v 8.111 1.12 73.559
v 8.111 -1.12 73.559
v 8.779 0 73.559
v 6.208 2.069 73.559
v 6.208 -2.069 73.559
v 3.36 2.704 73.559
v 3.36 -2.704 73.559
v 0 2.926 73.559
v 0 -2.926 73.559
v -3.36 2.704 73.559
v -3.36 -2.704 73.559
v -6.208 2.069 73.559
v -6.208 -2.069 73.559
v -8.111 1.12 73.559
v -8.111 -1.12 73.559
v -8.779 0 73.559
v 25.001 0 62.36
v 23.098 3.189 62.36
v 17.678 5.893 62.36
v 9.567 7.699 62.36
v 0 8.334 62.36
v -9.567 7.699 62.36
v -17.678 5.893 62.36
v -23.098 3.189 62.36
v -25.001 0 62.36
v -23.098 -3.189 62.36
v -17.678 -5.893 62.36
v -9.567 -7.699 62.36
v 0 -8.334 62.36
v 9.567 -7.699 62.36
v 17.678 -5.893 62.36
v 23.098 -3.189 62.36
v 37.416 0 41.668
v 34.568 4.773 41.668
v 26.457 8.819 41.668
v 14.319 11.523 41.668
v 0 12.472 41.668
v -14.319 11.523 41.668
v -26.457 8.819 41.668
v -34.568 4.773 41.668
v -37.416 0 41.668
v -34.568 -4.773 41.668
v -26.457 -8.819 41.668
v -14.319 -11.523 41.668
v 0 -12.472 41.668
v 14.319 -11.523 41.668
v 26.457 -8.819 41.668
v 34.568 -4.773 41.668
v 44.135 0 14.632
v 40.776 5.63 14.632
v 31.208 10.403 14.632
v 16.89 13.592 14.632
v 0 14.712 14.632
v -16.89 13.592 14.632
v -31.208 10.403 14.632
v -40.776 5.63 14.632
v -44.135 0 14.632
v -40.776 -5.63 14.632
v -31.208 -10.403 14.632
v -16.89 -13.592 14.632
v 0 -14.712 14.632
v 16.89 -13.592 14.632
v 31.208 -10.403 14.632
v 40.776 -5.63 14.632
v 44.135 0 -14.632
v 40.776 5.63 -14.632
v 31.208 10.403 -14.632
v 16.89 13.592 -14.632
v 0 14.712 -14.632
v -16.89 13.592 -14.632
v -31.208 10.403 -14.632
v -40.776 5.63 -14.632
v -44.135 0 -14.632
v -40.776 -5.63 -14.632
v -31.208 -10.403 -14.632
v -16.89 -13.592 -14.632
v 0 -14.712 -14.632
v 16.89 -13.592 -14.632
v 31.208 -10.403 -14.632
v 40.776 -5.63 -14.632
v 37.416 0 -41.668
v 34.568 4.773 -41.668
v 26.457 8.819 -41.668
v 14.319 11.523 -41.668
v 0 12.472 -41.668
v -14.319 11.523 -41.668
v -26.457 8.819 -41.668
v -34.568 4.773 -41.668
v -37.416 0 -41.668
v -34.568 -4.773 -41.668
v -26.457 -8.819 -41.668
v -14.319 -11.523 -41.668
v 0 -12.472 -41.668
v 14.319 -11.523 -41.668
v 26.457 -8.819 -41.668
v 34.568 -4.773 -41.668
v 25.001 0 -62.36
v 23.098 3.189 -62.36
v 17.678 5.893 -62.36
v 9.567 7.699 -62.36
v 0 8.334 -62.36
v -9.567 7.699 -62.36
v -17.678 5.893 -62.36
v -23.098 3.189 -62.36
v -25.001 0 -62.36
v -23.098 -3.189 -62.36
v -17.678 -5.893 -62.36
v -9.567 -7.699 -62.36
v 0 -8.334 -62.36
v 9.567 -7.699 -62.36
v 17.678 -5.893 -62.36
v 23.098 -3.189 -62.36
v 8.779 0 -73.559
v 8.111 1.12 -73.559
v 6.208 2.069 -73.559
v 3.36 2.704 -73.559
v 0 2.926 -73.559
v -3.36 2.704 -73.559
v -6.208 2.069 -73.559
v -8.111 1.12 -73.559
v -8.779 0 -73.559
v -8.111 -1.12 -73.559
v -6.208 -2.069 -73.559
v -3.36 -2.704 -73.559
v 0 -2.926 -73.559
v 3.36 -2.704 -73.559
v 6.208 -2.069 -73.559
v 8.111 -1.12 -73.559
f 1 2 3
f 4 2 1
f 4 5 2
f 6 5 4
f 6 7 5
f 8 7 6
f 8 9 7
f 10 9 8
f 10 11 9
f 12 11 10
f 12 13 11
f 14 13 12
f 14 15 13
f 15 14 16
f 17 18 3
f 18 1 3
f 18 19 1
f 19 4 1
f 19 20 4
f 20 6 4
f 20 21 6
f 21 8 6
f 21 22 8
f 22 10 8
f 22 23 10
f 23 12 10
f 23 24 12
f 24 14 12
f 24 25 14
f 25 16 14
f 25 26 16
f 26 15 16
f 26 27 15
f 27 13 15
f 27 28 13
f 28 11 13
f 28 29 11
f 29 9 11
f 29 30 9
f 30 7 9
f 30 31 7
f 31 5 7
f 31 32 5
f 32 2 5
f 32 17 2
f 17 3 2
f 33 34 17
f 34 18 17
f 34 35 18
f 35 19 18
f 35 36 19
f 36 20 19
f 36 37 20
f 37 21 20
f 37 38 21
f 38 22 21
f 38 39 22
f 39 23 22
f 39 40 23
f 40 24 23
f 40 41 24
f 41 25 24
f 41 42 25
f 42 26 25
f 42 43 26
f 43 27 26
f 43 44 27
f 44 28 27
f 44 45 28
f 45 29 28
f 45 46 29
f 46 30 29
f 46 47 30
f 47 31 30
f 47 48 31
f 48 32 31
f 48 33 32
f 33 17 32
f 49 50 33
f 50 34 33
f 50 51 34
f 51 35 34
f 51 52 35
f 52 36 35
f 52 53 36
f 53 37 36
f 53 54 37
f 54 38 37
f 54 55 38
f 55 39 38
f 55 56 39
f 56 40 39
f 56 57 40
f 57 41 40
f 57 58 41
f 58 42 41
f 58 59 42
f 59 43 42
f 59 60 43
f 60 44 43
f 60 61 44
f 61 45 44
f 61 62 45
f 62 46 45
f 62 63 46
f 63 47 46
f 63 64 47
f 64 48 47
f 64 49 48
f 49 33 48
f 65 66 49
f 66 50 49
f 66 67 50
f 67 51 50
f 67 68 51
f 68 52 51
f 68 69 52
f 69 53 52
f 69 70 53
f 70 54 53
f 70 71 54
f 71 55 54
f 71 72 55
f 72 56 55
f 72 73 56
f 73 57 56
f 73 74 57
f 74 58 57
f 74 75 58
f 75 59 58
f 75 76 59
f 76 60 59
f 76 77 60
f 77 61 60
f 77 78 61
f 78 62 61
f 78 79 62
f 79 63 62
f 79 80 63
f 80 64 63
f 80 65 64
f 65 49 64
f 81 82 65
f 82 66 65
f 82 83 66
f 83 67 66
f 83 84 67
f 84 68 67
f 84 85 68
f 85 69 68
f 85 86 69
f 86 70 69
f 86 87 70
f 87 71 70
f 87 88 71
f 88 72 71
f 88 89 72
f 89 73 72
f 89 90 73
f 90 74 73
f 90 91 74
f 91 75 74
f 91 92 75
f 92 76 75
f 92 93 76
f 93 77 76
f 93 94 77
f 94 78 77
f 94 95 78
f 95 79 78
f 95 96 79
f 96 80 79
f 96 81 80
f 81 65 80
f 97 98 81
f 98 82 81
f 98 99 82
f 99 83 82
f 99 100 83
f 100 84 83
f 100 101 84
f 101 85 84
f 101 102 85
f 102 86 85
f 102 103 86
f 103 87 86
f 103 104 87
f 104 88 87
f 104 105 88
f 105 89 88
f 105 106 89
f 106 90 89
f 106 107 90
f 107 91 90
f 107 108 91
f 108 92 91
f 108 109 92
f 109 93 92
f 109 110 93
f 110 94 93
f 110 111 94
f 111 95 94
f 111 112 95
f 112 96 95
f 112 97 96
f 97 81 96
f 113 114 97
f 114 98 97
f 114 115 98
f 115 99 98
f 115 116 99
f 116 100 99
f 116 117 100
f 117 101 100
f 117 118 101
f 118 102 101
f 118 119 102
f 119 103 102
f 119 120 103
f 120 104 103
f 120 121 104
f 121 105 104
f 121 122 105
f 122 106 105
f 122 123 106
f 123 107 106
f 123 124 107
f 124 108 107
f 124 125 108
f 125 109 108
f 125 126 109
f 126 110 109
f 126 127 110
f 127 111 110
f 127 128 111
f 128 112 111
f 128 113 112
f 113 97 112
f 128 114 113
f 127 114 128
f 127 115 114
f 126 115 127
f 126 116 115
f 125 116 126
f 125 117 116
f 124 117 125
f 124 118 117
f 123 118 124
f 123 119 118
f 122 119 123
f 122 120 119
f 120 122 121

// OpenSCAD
// Generated by SolidPython 1.0.1 on 2020-07-29 00:46:48


scale(v = [9, 3, 15]) {
	sphere(r = 5);
}
/***********************************************
*********      SolidPython code:      **********
************************************************
 
# import packages: SolidPython
from solid import *
from solid.utils import *
from itertools import chain, combinations, permutations


class Resize:

    def __init__(self, scad_file):
        self.scad_file = scad_file
        #self.scad_file = import_scad(scad_file)
        # cone/cylinder param:
        self.r1 = 0
        self.r2 = 0
        self.h = 0
        # rectangular prism param:
        self.w = 0
        self.l = 0
        # ellipse param:
        self.r = 0

    # import OpenScad code (file name corresponds to shape)


    # classify shape + parameters
    def assign(self, param1, param2, param3):
        if self.scad_file == 'cone.scad':
            self.r1 = param1
            self.r2 = param2
            self.h = param3
        elif self.scad_file == 'cylinder.scad':
            self.r1 = param1
            self.r2 = param2
            self.h = param3
        elif self.scad_file == 'rectangularPrism.scad':
            self.h = param1
            self.l = param2
            self.w = param3
        else:
            self.r = param1
            self.h = param2

    # resize parameters
    def iterate(self):
        x = range(3, 20, 2)
        i = 1
        if self.scad_file == 'cone.scad':
            tempList = list(permutations(x, 2))
            for temp in tempList:
                param1 = temp[0]
                param2 = temp[1]
                filepath = 'produced_scad_files/' + 'cone' + str(param1) + '_' + str(param2) + '_' + '.scad'
                scad_render_to_file(cylinder(h=param1, r1=param2, r2=0), filepath)

        elif self.scad_file == 'cylinder.scad':
            tempList = list(permutations(x, 3))
            for temp in tempList:
                param1 = temp[0]
                param2 = temp[1]
                filepath = 'produced_scad_files/' + 'cylinder' + str(param1) + '_' + str(param2) + '_' + '.scad'
                scad_render_to_file(cylinder(h=param1, r1=param2, r2=param2), filepath)

        elif self.scad_file == 'rectangularPrism.scad':
            tempList = list(permutations(x, 3))
            for temp in tempList:
                param1 = temp[0]
                param2 = temp[1]
                param3 = temp[2]
                filepath = 'produced_scad_files/' + 'rectangularPrism' + str(param1) + '_' + str(param2) + '_' + str(
                    param3) + '.scad'
                scad_render_to_file(cube(size=(param1, param2, param3)), filepath)

        elif self.scad_file == 'ellipse.scad':
            tempList = list(permutations(x, 4))
            for temp in tempList:
                param1 = temp[0]
                param2 = temp[1]
                param3 = temp[2]
                param4 = temp[3]
                filepath = 'produced_scad_files/' + 'ellipse' + str(param1) + '_' + str(param2) + '_' + str(param3) + '_' + str(param4) + '.scad'
                scad_render_to_file(scale([param1, param2, param3])(sphere(r=param4)), filepath)

    def render_to_scadfile(self):
        scad_render_to_file(scad, 'example.scad') 
 
************************************************/
